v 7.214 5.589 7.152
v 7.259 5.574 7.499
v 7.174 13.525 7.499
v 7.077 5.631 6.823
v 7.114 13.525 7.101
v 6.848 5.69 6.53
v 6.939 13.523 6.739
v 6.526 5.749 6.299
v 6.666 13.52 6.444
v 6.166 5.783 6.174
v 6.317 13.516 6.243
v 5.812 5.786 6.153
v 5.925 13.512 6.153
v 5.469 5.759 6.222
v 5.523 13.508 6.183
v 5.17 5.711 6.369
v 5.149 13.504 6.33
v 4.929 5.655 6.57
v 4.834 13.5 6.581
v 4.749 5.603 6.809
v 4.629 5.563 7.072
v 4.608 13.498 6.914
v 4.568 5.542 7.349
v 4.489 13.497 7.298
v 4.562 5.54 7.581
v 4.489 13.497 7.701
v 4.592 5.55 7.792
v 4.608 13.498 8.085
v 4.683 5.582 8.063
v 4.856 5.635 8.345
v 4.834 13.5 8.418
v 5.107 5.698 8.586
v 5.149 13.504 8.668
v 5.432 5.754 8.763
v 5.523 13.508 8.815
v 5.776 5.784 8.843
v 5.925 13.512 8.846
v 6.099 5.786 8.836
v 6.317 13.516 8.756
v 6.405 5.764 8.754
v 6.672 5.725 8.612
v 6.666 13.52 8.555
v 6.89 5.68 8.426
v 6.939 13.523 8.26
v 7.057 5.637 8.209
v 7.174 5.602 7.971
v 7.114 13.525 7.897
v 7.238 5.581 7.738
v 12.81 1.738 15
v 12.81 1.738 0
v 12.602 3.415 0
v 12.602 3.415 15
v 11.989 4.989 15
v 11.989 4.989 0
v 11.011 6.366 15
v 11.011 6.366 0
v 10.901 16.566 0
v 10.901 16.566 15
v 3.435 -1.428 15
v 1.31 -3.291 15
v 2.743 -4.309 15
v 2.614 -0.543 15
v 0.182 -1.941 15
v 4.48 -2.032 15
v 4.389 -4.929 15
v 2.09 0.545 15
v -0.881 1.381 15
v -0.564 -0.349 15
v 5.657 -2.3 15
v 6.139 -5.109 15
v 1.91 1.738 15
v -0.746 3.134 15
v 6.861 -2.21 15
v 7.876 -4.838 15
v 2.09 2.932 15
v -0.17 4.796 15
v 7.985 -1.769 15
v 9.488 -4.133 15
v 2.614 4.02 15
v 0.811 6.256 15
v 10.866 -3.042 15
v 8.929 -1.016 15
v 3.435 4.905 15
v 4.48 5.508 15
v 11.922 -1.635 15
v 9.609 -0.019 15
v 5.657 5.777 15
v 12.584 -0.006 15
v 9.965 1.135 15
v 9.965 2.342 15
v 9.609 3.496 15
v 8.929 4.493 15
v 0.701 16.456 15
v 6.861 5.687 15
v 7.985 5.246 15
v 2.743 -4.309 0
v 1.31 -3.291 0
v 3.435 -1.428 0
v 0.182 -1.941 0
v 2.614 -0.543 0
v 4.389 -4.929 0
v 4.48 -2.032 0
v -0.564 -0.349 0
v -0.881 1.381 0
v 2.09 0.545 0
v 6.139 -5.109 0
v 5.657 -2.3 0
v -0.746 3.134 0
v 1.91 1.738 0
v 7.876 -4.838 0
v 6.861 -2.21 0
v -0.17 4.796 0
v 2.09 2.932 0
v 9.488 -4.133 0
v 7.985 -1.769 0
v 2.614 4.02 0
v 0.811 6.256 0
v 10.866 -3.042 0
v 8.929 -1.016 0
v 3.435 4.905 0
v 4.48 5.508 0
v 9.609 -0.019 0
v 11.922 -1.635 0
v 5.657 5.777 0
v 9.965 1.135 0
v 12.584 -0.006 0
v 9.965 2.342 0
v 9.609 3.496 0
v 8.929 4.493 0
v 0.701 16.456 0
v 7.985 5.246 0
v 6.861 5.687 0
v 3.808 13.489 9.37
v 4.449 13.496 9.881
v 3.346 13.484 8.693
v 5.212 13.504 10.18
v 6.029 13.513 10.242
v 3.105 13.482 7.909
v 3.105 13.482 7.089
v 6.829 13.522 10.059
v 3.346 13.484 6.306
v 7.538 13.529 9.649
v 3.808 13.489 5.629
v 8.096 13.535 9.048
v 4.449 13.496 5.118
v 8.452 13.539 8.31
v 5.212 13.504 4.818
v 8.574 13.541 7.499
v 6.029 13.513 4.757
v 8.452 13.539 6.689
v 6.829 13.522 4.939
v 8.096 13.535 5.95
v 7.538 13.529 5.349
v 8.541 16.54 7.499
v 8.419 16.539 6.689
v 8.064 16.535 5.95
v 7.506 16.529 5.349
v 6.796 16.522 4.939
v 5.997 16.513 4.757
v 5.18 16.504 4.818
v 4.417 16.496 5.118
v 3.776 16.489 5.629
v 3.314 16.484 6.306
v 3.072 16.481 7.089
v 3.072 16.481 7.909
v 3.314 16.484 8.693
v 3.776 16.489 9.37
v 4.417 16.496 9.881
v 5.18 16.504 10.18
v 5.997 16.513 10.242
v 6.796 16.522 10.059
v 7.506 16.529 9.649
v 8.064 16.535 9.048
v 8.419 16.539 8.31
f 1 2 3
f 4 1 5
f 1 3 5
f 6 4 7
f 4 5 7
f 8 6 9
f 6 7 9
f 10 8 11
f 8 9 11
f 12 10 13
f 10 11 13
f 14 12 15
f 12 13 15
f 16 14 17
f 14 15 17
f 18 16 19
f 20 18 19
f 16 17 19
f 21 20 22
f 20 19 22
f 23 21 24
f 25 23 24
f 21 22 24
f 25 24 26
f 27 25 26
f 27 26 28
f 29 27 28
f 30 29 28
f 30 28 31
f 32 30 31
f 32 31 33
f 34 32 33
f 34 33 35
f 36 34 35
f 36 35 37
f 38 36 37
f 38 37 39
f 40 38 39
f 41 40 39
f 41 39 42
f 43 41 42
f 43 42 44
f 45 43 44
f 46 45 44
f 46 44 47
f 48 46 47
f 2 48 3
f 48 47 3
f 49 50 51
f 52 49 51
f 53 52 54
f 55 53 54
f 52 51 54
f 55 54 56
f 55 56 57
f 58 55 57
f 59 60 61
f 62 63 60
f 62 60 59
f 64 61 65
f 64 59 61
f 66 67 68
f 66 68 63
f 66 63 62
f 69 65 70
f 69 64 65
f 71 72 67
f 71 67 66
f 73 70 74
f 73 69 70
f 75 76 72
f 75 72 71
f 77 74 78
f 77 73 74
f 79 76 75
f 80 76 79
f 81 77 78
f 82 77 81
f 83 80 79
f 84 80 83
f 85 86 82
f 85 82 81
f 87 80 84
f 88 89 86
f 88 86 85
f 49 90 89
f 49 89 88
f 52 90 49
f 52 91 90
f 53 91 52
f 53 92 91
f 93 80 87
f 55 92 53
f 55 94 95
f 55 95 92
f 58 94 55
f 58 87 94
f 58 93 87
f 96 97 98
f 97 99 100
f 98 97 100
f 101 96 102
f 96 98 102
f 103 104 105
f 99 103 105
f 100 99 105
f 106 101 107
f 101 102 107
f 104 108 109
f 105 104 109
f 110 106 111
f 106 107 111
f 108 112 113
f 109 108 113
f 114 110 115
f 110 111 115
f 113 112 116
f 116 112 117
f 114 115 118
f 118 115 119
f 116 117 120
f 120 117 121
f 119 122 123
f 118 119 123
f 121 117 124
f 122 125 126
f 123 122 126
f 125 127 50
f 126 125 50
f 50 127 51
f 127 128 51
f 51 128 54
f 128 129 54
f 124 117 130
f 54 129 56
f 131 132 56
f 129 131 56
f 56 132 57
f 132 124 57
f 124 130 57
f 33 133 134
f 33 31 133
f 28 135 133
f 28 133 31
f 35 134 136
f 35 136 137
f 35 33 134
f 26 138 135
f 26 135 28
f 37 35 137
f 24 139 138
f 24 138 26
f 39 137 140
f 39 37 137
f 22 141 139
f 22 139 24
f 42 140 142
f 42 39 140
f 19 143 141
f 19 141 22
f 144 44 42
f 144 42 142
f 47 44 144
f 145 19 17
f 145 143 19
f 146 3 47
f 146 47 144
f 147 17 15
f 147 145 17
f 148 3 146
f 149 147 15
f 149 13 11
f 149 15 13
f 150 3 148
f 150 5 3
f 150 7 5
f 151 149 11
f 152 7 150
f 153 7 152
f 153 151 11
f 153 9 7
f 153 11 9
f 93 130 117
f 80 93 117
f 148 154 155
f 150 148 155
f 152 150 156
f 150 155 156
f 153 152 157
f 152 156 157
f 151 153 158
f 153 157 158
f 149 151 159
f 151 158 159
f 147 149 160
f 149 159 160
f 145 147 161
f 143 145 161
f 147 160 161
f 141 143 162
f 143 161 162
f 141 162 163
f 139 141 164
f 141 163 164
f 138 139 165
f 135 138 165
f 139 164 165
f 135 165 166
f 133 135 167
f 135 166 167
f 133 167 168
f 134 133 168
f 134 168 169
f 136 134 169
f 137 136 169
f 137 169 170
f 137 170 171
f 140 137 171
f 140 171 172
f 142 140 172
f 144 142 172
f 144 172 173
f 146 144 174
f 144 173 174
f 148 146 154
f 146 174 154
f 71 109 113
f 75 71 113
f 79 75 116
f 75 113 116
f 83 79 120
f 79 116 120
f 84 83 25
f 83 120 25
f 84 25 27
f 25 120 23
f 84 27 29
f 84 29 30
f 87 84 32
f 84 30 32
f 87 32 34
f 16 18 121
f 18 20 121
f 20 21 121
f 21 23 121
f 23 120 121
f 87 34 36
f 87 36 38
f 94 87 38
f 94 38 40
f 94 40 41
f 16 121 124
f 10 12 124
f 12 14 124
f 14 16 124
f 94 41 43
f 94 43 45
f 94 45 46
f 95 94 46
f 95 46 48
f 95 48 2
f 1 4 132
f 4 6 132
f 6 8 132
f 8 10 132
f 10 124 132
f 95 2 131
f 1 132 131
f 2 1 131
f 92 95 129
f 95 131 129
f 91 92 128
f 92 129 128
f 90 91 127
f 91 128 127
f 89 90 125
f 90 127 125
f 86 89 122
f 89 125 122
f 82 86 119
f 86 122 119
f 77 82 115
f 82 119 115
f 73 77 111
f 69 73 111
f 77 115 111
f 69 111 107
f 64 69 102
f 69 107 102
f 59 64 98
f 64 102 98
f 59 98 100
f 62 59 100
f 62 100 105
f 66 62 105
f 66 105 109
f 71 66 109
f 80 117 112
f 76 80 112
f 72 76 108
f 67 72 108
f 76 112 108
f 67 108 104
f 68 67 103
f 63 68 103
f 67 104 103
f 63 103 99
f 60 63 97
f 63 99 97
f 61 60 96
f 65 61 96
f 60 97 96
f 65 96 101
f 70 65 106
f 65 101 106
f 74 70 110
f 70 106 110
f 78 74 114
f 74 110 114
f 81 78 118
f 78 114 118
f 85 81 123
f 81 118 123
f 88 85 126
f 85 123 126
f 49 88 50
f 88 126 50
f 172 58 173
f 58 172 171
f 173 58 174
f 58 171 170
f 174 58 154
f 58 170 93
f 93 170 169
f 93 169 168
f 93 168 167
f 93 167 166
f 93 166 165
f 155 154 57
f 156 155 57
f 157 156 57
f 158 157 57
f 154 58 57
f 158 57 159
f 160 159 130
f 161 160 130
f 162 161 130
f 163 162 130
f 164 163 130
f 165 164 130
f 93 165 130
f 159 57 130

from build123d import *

# Parameters (mm, degrees)
BOSS_EXTRUDE1_DEPTH = 15
SKETCH2_R           = 2.75
CUT_EXTRUDE1_DEPTH  = 3
SKETCH3_R           = 1.35
CUT_EXTRUDE2_DEPTH  = 9
SKETCH4_R           = 4.05
CUT_EXTRUDE3_DEPTH  = 16


with BuildPart() as part:
    # Sketch1 → Boss-Extrude1 (new body)
    with BuildSketch(Plane.XY):
        with BuildLine():
            Line((0.700840098, 16.455896919), (0.810681557, 6.255896919))
            ThreePointArc((0.810681557, 6.255896919), (5.886159138, 8.587996721), (11.010681557, 6.365738378))
            Line((11.010681557, 6.365738378), (10.900840098, 16.565738378))
            Line((10.900840098, 16.565738378), (0.700840098, 16.455896919))
        make_face()
        with BuildLine():
            ThreePointArc((11.010681557, 6.365738378), (5.886159138, 8.587996721), (0.810681557, 6.255896919))
            Line((0.810681557, 6.255896919), (11.010681557, 6.365738378))
        make_face()
        with BuildLine():
            Line((11.010681557, 6.365738378), (0.810681557, 6.255896919))
            ThreePointArc((0.810681557, 6.255896919), (3.546395485, -4.672331118), (12.809920939, 1.738393871))
            ThreePointArc((12.809920939, 1.738393871), (12.344285051, 4.220811017), (11.010681557, 6.365738378))
        make_face()
    extrude(amount=BOSS_EXTRUDE1_DEPTH)

    # Sketch2 → Cut-Extrude1 (cut)
    with BuildSketch(Plane(origin=(-0.177107964, 16.446442498, 0), x_dir=(0.999942022, 0.010768146, 0), z_dir=(-0.010768146, 0.999942022, 0))):
        with Locations((5.96903182, -7.499323697)):
            Circle(SKETCH2_R)
    extrude(amount=-CUT_EXTRUDE1_DEPTH, mode=Mode.SUBTRACT)

    # Sketch3 → Cut-Extrude2 (cut)
    with BuildSketch(Plane(origin=(-0.144803526, 13.446616432, 0), x_dir=(0.999942022, 0.010768146, 0), z_dir=(-0.010768146, 0.999942022, 0))):
        with Locations((5.96903182, -7.499323697)):
            Circle(SKETCH3_R)
    extrude(amount=-CUT_EXTRUDE2_DEPTH, mode=Mode.SUBTRACT)

    # Sketch4 → Cut-Extrude3 (cut, through all)
    with BuildSketch(Plane(origin=(0, 0, 0), x_dir=(-1, 0, 0), z_dir=(0, 0, -1))):
        with Locations((-5.959920939, 1.738393871)):
            Circle(SKETCH4_R)
    extrude(amount=-CUT_EXTRUDE3_DEPTH, mode=Mode.SUBTRACT)


solid = part.part
